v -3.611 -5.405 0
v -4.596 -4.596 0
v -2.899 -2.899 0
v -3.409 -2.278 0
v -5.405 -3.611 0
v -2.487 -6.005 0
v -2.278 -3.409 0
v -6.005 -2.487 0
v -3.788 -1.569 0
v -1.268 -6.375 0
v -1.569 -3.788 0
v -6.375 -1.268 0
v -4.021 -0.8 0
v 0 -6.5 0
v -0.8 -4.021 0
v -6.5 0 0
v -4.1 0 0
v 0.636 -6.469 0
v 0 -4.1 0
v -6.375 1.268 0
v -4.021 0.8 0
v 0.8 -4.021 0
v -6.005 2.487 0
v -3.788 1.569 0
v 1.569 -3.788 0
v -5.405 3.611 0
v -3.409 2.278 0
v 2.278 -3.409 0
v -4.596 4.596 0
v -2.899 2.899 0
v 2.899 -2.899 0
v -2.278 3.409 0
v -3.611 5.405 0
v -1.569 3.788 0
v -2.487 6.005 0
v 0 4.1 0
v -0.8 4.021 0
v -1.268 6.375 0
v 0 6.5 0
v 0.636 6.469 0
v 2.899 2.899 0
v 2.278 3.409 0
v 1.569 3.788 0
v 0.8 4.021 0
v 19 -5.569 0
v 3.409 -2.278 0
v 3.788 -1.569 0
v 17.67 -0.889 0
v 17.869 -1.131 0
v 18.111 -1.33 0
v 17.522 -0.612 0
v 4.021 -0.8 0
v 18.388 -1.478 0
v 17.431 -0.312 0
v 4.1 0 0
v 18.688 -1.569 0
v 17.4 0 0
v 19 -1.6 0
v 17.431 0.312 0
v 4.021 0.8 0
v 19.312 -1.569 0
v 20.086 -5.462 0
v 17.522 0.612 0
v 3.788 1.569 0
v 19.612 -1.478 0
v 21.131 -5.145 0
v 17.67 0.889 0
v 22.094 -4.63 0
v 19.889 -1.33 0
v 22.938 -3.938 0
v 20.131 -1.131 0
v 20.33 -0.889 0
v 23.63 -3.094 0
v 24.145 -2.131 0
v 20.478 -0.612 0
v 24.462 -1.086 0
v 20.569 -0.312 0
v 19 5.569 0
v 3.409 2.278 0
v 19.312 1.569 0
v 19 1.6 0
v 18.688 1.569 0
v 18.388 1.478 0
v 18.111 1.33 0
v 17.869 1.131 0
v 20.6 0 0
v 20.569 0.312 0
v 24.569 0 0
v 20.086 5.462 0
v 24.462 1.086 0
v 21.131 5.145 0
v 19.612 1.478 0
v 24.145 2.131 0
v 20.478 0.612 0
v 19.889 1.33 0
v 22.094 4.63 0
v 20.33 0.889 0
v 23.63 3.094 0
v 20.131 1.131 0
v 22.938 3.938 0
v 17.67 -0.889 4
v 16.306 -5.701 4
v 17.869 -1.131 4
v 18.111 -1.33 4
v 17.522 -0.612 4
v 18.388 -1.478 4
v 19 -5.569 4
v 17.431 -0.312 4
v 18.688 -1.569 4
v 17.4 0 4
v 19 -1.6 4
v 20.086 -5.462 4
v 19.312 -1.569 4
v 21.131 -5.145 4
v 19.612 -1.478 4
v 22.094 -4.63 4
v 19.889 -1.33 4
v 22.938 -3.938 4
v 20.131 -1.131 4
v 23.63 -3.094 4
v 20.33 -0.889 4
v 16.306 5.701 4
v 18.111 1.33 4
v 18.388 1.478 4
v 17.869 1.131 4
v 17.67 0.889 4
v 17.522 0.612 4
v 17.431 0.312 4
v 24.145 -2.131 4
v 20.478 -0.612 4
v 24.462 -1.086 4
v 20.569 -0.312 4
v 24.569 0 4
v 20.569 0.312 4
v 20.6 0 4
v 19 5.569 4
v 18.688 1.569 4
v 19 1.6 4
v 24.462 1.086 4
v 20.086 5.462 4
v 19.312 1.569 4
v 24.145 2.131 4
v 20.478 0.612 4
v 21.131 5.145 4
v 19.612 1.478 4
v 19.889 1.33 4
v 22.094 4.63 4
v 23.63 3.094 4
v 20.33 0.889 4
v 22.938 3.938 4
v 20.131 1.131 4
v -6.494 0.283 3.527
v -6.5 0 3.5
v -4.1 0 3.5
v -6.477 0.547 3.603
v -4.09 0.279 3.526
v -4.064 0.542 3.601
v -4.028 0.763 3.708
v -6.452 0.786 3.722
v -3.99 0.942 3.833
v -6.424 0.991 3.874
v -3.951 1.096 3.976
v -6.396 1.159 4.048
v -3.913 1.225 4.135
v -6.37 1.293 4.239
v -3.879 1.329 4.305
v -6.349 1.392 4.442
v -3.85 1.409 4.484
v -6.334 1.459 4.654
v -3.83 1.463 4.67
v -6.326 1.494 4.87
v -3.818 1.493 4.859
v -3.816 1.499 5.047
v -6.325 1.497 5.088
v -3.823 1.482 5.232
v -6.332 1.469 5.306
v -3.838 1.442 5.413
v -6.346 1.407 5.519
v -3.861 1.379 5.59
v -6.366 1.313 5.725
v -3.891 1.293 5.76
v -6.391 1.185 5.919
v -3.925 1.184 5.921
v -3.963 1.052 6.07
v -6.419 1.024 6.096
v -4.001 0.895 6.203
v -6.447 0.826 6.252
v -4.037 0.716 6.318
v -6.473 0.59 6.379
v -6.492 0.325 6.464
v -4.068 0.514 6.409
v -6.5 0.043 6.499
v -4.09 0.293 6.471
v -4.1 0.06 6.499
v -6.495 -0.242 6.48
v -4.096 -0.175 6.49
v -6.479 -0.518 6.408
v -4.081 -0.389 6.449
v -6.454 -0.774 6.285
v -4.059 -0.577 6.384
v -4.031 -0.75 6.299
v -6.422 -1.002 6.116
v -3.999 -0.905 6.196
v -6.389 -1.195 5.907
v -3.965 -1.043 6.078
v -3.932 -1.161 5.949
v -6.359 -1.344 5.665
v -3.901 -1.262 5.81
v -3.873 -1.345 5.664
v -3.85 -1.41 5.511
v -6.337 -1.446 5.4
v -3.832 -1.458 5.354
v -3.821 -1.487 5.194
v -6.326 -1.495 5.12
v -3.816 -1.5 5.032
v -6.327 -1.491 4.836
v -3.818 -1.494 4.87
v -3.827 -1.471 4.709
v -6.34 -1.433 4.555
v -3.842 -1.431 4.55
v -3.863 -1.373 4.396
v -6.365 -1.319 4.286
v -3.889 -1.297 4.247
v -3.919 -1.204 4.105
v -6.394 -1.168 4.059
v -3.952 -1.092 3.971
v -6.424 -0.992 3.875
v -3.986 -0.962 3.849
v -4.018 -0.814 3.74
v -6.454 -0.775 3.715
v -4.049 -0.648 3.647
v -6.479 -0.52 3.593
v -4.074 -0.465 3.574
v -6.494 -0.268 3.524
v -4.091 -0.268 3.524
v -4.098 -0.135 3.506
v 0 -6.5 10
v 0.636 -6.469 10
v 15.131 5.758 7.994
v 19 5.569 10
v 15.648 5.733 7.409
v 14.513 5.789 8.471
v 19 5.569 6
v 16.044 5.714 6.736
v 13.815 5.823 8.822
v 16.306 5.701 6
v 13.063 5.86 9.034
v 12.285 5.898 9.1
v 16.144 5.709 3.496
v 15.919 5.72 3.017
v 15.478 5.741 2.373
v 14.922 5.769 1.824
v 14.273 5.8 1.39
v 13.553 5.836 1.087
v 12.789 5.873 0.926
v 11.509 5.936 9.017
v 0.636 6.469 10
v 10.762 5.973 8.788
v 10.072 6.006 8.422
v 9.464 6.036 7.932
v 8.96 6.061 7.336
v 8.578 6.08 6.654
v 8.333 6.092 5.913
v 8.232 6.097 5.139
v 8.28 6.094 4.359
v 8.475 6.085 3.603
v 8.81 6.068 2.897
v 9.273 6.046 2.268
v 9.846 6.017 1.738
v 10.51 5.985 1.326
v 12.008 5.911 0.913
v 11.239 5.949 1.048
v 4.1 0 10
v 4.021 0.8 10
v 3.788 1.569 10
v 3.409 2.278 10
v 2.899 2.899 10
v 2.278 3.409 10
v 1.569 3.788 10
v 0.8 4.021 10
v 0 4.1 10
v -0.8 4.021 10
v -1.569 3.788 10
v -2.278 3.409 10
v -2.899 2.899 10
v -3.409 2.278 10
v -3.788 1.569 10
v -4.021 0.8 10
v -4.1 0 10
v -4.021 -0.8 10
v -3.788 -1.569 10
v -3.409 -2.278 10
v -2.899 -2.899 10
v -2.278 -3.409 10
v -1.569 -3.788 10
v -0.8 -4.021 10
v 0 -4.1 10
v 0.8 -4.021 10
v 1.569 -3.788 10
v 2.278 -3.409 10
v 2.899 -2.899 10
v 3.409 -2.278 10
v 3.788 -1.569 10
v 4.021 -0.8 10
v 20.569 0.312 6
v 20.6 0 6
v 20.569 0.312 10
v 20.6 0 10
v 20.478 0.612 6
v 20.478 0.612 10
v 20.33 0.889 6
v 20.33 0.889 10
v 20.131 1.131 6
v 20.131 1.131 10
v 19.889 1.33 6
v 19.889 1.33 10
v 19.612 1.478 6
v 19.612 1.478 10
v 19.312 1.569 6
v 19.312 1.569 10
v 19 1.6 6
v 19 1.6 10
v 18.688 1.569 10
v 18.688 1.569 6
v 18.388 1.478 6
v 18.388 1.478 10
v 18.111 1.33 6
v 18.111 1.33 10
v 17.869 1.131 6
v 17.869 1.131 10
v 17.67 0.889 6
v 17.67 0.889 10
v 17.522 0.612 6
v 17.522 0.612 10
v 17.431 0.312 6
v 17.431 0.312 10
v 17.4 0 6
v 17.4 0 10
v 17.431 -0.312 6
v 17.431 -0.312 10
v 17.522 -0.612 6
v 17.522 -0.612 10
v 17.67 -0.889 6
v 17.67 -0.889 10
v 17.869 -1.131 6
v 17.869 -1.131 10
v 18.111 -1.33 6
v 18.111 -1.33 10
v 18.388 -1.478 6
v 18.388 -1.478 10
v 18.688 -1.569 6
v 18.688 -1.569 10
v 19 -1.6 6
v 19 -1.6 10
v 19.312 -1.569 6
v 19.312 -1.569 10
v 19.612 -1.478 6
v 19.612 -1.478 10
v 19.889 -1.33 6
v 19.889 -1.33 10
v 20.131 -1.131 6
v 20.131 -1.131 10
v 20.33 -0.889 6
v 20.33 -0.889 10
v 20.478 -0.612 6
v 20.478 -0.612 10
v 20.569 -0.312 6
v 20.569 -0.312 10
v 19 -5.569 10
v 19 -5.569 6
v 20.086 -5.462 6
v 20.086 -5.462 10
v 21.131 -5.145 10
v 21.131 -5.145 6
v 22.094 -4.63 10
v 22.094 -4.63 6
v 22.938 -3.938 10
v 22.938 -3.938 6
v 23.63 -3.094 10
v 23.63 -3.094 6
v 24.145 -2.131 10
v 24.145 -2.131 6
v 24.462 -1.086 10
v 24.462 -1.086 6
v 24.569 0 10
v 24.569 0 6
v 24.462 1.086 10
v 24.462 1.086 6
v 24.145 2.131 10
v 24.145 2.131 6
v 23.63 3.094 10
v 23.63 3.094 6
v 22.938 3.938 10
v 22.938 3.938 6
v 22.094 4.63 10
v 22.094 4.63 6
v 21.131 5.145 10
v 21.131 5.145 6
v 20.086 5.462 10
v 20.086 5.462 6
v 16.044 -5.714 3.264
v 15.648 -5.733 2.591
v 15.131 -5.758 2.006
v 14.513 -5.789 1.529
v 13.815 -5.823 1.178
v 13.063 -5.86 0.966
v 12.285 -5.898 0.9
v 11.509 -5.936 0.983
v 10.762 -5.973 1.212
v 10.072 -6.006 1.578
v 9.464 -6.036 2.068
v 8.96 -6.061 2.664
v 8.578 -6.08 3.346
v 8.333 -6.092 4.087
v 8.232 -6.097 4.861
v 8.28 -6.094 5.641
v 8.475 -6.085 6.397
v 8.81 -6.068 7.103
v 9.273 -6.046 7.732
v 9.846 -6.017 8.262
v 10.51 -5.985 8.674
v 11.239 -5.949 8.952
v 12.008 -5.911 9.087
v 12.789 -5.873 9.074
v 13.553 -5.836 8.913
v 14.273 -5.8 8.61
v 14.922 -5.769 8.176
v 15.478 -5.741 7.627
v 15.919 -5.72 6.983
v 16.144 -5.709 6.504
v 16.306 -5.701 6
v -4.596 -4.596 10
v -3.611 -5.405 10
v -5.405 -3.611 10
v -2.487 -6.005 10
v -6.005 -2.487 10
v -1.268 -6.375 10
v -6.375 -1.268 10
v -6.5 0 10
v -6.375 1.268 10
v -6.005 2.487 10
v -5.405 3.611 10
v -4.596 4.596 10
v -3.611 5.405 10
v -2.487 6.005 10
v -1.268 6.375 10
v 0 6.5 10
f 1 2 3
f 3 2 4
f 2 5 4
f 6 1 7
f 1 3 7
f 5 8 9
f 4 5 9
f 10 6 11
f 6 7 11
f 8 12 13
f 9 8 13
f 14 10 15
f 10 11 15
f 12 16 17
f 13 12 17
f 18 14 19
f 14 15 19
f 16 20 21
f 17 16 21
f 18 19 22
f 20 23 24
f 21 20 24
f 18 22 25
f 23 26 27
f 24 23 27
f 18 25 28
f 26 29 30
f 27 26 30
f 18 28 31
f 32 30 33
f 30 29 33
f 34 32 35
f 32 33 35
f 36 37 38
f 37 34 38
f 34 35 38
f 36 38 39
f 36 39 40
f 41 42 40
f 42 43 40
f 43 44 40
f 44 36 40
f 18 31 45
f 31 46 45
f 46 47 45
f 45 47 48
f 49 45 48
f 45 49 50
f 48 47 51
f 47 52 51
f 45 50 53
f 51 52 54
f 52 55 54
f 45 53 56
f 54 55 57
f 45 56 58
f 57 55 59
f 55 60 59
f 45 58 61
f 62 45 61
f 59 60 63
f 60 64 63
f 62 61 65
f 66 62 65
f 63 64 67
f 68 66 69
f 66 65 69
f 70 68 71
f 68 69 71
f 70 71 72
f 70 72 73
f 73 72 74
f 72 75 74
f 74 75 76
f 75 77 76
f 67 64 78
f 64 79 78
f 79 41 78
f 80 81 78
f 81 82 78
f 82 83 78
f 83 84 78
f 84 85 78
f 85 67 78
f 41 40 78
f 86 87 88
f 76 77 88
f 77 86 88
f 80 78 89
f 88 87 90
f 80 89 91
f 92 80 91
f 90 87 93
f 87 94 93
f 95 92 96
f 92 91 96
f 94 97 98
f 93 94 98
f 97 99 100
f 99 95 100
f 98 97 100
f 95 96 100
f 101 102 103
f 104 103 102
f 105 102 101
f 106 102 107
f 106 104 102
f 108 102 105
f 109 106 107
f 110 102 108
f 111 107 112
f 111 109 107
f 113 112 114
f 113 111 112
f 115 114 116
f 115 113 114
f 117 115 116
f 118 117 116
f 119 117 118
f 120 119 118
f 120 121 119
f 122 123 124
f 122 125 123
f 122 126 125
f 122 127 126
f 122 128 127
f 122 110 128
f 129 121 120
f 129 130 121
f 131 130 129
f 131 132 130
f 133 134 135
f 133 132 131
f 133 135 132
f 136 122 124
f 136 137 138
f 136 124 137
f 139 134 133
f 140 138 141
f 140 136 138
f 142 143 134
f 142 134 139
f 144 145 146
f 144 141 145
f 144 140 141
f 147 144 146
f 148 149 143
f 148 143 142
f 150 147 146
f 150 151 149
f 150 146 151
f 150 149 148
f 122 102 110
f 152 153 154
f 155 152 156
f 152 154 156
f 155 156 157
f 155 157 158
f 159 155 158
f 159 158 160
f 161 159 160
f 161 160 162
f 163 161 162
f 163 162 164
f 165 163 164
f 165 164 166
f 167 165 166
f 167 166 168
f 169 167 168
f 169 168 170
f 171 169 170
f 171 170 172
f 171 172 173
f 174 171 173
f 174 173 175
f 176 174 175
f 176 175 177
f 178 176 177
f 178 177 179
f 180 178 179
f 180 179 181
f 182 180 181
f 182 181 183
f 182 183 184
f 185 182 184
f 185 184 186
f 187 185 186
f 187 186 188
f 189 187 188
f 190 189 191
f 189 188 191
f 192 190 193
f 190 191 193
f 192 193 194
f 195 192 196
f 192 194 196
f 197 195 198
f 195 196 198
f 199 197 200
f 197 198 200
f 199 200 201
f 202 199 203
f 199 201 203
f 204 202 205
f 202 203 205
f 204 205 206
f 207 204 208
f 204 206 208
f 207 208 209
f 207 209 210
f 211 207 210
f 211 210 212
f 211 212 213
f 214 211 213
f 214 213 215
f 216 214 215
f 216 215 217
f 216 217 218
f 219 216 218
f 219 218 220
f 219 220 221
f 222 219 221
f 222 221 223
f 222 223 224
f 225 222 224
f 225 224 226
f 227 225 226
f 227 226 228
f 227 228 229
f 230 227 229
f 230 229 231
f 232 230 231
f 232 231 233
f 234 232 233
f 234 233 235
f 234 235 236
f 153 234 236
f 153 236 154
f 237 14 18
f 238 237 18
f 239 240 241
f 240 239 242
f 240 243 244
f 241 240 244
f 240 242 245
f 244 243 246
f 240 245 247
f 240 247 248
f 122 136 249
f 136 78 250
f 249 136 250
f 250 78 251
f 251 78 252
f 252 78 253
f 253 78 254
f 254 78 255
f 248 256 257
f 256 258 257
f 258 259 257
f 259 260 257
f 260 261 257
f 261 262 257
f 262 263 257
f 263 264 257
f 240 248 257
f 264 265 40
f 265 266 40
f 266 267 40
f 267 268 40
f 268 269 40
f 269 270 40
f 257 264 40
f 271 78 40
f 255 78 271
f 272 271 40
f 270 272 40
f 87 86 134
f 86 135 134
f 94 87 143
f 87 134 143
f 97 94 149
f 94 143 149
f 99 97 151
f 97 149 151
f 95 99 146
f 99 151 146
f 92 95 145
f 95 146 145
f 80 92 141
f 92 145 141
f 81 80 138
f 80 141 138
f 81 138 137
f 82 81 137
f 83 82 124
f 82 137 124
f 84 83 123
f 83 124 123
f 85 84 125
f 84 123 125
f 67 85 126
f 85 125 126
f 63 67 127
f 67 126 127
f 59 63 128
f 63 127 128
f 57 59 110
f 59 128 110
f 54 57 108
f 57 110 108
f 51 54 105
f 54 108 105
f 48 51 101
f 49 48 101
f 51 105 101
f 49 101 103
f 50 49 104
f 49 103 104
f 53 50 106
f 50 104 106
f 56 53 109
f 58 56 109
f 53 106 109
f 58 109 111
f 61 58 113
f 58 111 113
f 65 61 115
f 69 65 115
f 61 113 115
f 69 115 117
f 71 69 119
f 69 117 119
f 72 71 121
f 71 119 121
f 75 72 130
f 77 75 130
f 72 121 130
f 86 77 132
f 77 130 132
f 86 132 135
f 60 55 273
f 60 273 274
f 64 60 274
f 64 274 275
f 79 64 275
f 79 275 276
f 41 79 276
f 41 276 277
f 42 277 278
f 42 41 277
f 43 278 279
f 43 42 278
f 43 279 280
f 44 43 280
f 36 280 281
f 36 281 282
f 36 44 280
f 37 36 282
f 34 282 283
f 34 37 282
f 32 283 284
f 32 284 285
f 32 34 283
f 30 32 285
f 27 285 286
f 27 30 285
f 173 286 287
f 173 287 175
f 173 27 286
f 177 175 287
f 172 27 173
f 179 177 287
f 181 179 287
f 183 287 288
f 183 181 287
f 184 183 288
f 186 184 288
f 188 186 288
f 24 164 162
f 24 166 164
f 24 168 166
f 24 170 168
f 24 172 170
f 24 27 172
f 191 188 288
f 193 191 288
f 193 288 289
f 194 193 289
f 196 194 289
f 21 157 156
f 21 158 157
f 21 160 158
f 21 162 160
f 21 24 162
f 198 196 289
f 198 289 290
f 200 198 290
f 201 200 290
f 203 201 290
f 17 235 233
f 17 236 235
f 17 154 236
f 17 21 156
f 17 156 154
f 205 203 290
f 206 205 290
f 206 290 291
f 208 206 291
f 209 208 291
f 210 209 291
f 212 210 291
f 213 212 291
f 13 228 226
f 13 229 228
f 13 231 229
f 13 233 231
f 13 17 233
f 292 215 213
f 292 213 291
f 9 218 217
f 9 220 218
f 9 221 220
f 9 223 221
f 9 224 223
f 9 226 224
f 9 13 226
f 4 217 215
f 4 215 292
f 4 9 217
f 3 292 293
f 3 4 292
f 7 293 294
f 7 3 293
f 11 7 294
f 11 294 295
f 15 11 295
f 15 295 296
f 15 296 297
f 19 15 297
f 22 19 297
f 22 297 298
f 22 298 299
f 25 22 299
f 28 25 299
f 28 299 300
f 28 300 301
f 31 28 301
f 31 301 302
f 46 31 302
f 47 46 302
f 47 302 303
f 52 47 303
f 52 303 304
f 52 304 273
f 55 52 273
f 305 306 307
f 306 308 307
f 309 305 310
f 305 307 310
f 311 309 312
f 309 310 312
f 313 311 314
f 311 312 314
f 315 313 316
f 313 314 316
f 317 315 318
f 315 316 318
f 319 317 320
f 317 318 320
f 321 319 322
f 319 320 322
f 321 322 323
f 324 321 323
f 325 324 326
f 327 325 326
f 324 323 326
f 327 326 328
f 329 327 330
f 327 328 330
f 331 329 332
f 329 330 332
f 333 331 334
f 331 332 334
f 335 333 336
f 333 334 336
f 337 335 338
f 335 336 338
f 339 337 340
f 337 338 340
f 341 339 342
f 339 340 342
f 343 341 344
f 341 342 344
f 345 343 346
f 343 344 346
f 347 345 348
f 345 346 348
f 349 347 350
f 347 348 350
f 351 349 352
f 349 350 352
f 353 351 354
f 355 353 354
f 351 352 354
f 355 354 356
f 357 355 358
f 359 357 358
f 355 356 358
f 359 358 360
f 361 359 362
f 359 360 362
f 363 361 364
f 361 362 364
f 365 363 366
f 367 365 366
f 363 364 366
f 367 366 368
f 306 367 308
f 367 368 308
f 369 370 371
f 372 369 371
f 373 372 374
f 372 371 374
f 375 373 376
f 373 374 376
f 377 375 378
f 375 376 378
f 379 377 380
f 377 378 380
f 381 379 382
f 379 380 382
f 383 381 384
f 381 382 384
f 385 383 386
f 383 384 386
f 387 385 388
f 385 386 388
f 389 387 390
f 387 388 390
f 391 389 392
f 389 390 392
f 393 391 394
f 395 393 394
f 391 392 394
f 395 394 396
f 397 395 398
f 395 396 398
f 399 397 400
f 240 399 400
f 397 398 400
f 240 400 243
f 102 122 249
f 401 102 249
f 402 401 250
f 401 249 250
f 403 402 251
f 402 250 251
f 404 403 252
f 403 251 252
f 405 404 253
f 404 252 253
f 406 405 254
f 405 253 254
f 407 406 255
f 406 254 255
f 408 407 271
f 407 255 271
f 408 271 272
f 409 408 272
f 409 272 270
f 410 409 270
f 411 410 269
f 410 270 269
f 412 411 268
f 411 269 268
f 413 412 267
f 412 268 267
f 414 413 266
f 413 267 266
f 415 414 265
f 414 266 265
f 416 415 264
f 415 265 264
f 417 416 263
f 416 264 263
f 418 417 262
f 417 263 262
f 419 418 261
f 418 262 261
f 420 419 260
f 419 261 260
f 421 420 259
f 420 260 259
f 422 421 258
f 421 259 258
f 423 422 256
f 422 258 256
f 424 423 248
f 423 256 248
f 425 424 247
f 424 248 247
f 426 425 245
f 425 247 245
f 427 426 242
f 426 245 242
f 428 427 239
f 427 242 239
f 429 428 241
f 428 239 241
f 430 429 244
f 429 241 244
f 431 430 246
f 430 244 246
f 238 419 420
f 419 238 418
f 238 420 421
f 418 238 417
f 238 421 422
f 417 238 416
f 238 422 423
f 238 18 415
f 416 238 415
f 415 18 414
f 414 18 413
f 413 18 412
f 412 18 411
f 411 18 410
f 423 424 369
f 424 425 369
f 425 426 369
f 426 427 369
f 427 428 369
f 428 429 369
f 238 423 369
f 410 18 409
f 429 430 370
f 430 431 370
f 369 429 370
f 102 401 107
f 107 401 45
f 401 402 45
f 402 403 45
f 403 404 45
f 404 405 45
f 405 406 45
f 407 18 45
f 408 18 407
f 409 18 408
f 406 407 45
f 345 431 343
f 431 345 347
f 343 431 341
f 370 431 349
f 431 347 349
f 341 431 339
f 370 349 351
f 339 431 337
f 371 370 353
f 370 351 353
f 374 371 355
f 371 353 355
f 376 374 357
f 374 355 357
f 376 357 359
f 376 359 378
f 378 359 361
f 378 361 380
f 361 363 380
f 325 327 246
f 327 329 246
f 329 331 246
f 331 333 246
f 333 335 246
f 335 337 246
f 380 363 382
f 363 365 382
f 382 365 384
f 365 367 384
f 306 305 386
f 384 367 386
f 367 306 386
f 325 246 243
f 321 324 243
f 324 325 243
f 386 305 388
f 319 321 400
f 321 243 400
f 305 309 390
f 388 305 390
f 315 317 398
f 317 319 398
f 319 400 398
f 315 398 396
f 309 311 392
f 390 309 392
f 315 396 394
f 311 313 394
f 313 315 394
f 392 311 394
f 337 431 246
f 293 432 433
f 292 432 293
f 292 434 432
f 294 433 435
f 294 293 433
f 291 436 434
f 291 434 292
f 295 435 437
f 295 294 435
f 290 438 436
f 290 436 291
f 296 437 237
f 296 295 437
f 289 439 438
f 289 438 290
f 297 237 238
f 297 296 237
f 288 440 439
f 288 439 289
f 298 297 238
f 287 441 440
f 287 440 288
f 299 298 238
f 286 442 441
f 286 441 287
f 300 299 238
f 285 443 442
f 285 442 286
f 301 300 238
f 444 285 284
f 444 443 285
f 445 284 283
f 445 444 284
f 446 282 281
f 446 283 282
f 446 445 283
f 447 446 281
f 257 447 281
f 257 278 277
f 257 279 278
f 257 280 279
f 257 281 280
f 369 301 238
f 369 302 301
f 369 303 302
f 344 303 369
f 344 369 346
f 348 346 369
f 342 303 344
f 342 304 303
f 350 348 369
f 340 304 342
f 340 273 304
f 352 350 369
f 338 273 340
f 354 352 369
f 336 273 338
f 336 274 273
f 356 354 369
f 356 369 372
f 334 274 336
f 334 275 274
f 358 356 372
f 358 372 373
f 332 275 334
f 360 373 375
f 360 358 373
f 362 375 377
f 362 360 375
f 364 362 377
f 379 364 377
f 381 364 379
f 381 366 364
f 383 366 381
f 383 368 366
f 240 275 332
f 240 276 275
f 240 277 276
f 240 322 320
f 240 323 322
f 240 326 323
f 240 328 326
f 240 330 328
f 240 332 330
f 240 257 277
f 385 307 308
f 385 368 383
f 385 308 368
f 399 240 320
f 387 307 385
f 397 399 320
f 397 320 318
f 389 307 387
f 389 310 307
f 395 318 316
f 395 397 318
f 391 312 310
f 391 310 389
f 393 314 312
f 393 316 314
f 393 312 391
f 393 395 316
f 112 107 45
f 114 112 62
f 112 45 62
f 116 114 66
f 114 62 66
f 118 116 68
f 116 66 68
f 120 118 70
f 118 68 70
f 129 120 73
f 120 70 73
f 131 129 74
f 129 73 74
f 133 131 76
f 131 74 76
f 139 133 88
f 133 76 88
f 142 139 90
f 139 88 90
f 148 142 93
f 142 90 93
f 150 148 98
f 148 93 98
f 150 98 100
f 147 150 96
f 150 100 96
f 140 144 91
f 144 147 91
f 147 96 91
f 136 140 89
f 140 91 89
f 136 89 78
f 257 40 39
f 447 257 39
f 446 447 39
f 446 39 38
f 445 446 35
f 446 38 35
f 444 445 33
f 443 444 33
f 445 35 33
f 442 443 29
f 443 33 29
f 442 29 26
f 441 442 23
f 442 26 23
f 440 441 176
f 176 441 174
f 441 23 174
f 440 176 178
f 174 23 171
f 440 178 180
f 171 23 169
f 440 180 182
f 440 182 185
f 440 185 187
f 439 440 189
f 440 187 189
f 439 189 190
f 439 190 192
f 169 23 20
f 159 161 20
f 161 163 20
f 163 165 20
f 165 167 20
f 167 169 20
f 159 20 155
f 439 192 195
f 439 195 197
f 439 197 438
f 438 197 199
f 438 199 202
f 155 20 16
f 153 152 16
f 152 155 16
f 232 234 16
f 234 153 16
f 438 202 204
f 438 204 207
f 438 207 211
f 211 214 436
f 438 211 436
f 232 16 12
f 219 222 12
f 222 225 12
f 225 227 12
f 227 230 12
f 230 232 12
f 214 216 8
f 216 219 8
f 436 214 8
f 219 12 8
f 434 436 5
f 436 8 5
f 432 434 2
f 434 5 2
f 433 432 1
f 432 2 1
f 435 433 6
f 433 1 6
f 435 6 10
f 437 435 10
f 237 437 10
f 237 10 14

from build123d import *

# Parameters (mm, degrees)
SKETCH_1_R          = 4.1
EXTRUDE_1_DEPTH     = 10
SKETCH_6_R          = 4.1
CUT_EXTRUDE_2_DEPTH = 9.5
SKETCH_10_W         = 17.049616116
SKETCH_10_H         = 20.362574698
CUT_EXTRUDE_4_DEPTH = 1
SKETCH_11_R         = 1.6
CUT_EXTRUDE_5_DEPTH = 19.5
SKETCH_12_R         = 1.5
CUT_EXTRUDE_6_DEPTH = 39


with BuildPart() as part:
    # 草图1 → 凸台-拉伸1 (new body)
    with BuildSketch(Plane.XY):
        with BuildLine():
            Line((0.635580845, 6.468851288), (0, 6.5))
            ThreePointArc((0, 6.5), (-6.5, 0), (0, -6.5))
            Line((0, -6.5), (0.635580845, -6.468851288))
            Line((0.635580845, -6.468851288), (19, -5.568843046))
            ThreePointArc((19, -5.568843046), (24.568843046, 0), (19, 5.568843046))
            Line((19, 5.568843046), (0.635580845, 6.468851288))
        make_face()
        Circle(SKETCH_1_R, mode=Mode.SUBTRACT)
    extrude(amount=EXTRUDE_1_DEPTH)

    # 草图6 → 切除-拉伸2 (cut, symmetric)
    with BuildSketch(Plane(origin=(0, 0, 0), x_dir=(1, 0, 0), z_dir=(0, 1, 0))):
        with Locations((12.329939964, -5)):
            Circle(SKETCH_6_R)
    extrude(amount=CUT_EXTRUDE_2_DEPTH, both=True, mode=Mode.SUBTRACT)

    # 草图10 → 切除-拉伸4 (cut, symmetric)
    with BuildSketch(Plane.XY.offset(5)):
        with Locations((20.789235985, -0.838548644)):
            Rectangle(SKETCH_10_W, SKETCH_10_H)
    extrude(amount=CUT_EXTRUDE_4_DEPTH, both=True, mode=Mode.SUBTRACT)

    # 草图11 → 切除-拉伸5 (cut, symmetric)
    with BuildSketch(Plane.XY.offset(10)):
        with Locations((19, 0)):
            Circle(SKETCH_11_R)
    extrude(amount=CUT_EXTRUDE_5_DEPTH, both=True, mode=Mode.SUBTRACT)

    # 草图12 → 切除-拉伸6 (cut)
    with BuildSketch(Plane(origin=(0, 0, 0), x_dir=(0, 0, -1), z_dir=(1, 0, 0))):
        with Locations((-5, 0)):
            Circle(SKETCH_12_R)
    extrude(amount=-CUT_EXTRUDE_6_DEPTH, mode=Mode.SUBTRACT)


solid = part.part
